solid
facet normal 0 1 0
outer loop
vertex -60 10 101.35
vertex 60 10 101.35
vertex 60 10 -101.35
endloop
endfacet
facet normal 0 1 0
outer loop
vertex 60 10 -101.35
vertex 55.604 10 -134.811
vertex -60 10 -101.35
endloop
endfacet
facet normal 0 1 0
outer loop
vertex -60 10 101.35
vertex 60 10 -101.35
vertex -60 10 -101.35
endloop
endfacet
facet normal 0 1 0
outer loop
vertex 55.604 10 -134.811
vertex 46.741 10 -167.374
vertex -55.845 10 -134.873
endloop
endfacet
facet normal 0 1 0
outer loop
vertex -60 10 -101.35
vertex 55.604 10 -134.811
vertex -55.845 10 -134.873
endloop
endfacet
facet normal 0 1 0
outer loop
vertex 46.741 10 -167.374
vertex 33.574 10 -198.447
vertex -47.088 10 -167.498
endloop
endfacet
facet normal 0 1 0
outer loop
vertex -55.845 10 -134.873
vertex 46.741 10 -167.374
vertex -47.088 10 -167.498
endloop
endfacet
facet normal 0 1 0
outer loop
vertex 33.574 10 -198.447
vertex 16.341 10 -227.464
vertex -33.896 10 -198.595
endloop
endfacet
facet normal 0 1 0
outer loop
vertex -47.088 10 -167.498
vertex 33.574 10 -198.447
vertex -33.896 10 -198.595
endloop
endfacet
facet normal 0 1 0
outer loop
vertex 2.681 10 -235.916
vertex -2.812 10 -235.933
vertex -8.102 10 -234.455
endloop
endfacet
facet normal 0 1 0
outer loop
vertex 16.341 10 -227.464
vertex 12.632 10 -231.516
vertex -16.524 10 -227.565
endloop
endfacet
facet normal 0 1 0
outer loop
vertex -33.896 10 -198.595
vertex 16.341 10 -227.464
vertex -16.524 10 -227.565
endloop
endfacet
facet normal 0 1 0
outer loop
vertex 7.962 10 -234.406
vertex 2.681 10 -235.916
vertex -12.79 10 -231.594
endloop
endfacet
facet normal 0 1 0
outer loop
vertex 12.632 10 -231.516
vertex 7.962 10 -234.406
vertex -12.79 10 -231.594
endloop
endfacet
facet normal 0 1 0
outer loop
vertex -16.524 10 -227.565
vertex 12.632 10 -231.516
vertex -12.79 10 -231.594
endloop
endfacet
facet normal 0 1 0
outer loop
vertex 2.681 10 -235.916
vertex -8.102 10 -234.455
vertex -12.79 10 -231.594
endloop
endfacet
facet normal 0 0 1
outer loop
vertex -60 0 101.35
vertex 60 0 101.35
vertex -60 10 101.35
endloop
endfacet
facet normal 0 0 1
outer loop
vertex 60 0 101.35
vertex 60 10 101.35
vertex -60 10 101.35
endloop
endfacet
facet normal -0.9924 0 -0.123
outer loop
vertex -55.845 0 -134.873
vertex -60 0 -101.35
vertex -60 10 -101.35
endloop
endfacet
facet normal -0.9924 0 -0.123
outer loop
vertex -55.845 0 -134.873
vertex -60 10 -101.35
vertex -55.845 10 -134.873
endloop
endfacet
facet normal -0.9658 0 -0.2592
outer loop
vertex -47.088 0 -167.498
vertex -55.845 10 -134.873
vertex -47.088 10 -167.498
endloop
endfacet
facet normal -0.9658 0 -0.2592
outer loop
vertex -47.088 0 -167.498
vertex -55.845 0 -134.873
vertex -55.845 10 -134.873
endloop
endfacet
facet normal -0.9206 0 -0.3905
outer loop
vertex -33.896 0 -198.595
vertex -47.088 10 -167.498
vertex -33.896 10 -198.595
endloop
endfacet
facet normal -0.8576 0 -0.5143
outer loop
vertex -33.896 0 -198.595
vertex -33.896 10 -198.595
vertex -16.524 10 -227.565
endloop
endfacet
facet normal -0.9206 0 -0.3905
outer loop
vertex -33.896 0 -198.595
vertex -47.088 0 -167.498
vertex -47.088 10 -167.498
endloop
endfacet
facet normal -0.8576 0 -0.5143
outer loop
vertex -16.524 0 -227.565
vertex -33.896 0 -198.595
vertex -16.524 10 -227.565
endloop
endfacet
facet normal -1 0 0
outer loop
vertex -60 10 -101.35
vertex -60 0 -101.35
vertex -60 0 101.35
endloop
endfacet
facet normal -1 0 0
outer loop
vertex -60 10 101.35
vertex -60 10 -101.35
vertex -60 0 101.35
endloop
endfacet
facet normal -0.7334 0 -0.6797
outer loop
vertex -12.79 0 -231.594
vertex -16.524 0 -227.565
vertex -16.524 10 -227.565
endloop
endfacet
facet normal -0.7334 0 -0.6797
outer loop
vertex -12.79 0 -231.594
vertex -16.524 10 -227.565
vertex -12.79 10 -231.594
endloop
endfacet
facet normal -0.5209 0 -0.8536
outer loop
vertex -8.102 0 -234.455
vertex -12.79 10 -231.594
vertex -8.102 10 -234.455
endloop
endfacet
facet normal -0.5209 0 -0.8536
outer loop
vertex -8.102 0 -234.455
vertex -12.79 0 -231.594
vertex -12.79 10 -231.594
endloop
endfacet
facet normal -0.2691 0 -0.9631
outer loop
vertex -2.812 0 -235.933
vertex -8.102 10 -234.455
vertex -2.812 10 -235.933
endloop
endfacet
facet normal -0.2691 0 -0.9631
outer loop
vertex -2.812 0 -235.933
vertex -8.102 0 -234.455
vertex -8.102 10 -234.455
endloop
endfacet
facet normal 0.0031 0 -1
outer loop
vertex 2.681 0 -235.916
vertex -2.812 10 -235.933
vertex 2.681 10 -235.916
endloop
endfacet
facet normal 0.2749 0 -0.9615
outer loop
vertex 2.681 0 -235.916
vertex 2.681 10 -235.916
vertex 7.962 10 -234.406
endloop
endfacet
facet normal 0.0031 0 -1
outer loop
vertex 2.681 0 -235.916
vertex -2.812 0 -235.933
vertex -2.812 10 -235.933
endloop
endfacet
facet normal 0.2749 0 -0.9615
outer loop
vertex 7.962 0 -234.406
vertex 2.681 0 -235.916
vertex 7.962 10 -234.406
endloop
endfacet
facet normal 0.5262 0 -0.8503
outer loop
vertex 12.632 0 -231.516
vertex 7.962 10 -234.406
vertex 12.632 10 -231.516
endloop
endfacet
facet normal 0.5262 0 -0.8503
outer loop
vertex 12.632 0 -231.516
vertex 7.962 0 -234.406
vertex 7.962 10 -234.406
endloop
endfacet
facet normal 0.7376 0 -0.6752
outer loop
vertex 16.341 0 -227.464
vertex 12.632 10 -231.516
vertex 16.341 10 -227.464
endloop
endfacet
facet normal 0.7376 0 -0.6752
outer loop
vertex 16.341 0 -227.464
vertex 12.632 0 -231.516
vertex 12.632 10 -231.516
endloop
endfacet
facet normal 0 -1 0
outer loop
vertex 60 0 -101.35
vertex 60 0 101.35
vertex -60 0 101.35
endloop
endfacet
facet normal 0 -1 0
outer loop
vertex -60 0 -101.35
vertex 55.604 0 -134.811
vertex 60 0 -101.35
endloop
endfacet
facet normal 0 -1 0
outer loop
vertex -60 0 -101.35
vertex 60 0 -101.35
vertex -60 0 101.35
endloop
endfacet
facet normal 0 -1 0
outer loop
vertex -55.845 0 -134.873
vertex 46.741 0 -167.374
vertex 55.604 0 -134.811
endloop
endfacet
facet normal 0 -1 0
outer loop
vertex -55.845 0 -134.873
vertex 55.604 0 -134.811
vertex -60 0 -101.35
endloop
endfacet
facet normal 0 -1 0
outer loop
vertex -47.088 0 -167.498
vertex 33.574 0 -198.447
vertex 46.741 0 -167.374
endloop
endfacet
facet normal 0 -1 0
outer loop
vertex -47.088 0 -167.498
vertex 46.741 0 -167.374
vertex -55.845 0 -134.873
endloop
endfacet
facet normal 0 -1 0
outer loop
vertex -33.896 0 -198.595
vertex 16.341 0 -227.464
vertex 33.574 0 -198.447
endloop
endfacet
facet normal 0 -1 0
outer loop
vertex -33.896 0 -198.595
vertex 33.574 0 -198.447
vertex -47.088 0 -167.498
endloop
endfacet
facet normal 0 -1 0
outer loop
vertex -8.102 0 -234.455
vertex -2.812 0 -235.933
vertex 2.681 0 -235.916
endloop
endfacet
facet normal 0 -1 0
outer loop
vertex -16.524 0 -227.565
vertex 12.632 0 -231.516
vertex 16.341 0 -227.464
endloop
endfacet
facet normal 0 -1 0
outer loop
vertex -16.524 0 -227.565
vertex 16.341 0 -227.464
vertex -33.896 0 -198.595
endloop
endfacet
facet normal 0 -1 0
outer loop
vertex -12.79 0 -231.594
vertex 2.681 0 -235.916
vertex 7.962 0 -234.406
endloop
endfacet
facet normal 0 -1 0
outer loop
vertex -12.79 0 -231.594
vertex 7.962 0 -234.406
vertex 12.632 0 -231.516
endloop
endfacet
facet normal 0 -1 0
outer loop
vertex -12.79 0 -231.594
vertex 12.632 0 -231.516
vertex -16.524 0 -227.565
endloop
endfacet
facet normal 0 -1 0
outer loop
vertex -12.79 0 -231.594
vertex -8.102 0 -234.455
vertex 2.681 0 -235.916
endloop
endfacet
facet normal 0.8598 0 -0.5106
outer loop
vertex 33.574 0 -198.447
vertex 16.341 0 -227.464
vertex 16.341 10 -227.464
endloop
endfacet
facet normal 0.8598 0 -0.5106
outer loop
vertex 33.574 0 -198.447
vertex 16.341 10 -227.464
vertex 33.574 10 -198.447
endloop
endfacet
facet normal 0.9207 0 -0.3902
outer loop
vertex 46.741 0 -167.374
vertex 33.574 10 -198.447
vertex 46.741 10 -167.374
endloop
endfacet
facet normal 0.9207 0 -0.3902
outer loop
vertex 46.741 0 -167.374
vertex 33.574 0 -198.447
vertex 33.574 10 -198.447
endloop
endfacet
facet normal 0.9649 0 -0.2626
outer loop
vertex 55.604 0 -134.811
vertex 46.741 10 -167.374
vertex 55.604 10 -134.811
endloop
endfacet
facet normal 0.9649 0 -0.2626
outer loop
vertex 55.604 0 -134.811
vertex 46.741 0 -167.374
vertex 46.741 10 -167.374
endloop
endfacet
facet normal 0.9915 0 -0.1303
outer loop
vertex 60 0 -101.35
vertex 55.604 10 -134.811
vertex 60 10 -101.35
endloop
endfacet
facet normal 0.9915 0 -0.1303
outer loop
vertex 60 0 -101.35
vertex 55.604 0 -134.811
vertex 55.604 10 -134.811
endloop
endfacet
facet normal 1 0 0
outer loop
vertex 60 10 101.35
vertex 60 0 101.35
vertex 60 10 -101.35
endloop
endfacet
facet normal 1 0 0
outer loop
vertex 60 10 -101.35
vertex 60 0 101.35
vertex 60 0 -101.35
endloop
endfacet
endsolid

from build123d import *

# Parameters (mm, degrees)
THICKEN1_T1 = 10


with BuildPart() as body_1:
    # Sketch2 → Surface-Plane1: a flat surface bounded by the sketch
    with BuildSketch(Plane(origin=(0, 0, 0), x_dir=(1, 0, 0), z_dir=(0, 1, 0)), mode=Mode.PRIVATE) as surface_plane1_1_region:
        with BuildLine():
            Line((60, -101.35), (-60, -101.35))
            Line((-60, -101.35), (-60, 101.35))
            ThreePointArc((-60, 101.35), (-47.087611837, 167.497853897), (-16.523672609, 227.565432191))
            ThreePointArc((-16.523672609, 227.565432191), (-0.064821019, 236.113976909), (16.340966999, 227.464032864))
            ThreePointArc((16.340966999, 227.464032864), (46.741380265, 167.374149084), (60, 101.35))
            Line((60, 101.35), (60, -101.35))
        make_face()
    surface_plane1_1 = surface_plane1_1_region.sketch.faces()[0]
    add(Solid.thicken(surface_plane1_1, THICKEN1_T1))


solid = body_1.part
